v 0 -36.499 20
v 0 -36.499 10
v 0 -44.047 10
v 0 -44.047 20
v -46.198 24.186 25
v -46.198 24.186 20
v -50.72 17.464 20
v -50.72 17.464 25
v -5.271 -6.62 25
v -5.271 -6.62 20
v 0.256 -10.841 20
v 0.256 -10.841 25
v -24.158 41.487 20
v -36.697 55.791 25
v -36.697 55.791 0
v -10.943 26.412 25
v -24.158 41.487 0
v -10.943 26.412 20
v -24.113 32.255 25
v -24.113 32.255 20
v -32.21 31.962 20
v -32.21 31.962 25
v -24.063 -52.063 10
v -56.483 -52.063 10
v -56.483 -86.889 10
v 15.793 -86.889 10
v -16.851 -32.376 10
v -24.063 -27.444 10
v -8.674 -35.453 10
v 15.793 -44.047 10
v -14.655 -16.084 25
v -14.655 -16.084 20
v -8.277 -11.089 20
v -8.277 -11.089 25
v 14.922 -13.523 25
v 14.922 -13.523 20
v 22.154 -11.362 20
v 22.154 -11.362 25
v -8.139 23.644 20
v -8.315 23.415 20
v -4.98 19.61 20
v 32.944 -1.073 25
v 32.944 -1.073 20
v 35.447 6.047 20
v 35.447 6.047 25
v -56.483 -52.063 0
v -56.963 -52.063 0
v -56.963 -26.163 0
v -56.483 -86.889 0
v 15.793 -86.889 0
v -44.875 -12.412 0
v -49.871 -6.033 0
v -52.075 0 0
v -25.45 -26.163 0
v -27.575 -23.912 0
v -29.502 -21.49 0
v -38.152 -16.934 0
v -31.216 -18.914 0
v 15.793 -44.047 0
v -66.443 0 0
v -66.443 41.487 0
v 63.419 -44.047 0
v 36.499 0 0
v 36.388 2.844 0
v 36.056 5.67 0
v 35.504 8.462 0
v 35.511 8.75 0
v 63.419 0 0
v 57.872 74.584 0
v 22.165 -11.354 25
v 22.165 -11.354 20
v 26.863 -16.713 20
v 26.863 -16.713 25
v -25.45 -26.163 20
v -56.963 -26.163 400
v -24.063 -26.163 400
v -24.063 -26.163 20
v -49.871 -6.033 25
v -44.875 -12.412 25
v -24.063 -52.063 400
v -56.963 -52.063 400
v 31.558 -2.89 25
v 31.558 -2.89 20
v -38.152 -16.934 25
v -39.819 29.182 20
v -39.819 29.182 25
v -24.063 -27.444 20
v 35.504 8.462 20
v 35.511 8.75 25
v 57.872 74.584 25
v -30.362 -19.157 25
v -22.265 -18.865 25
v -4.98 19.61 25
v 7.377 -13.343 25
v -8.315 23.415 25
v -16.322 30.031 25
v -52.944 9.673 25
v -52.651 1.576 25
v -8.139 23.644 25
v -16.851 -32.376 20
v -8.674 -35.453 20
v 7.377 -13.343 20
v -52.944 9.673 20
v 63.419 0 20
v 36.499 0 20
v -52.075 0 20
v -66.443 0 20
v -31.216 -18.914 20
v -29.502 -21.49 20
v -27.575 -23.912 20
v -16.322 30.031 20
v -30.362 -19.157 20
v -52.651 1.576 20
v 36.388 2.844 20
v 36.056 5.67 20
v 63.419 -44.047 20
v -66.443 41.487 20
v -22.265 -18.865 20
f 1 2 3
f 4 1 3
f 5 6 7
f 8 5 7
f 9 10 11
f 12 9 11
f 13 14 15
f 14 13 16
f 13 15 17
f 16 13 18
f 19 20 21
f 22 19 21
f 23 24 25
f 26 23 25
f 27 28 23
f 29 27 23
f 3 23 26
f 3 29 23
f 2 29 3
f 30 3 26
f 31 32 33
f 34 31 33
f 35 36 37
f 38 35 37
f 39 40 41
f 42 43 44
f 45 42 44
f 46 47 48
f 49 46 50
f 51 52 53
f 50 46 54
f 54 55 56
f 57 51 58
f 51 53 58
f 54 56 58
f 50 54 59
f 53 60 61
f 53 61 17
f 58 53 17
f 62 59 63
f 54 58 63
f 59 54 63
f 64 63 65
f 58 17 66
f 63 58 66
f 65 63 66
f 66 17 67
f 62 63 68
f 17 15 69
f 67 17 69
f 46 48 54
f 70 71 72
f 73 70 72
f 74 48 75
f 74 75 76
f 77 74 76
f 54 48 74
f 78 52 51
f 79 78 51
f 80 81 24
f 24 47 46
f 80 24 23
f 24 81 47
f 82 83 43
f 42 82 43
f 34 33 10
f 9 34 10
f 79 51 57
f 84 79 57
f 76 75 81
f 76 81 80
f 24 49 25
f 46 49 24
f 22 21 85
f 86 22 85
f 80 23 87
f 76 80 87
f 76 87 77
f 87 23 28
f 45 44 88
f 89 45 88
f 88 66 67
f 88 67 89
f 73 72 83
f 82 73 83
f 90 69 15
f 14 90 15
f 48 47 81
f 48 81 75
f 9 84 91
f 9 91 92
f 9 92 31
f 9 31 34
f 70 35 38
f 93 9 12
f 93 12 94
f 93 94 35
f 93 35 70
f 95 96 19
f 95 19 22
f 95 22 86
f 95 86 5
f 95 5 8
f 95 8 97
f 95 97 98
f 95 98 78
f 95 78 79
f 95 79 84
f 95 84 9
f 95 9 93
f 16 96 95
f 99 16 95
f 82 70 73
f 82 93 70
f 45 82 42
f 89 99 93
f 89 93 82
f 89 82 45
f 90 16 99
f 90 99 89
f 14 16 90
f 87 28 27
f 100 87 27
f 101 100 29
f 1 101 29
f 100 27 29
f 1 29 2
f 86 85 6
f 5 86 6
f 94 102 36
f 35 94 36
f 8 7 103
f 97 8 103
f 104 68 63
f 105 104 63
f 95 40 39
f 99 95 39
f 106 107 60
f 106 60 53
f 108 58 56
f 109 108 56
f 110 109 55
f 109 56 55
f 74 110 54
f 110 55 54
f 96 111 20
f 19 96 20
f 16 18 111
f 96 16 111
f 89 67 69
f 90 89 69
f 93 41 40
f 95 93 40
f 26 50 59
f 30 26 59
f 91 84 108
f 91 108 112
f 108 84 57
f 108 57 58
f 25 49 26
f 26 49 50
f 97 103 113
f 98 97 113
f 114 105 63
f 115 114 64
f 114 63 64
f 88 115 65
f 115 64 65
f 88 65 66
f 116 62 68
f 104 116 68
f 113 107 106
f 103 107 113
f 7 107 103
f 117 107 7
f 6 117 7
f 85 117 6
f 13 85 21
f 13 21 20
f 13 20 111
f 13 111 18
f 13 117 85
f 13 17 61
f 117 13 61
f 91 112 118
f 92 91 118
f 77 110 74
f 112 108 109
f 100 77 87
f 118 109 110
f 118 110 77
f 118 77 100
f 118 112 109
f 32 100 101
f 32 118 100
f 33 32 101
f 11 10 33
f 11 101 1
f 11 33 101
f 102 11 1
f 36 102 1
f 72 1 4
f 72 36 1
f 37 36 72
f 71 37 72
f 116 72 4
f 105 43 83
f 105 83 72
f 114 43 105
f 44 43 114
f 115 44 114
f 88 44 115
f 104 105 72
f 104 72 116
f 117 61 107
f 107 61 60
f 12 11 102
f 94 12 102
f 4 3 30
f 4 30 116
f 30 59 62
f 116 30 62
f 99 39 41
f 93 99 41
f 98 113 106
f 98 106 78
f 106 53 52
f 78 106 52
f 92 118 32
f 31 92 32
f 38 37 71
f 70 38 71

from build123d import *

# Parameters (mm, degrees)
F1_DEPTH = 20
F3_DEPTH = 25
F4_W     = 32.8999999911
F4_H     = 25.900002569
F5_DEPTH = 400
F6_W     = 72.2760502249
F6_H     = 60.5556070805
F7_DEPTH = 10


with BuildPart() as f1:
    # F0 (on Top) → F1 (new body)
    with BuildSketch(Plane.XY):
        with BuildLine():
            Line((0, -36.4989928704), (0, 0))
            Line((0, 0), (-36.4989928704, 0))
            ThreePointArc((-36.4989928704, 0), (-25.8086853652, -25.8086853652), (0, -36.4989928704))
        make_face()
        with BuildLine():
            Line((-36.4989928704, 0), (0, 0))
            Line((0, 0), (0, 36.4989928704))
            ThreePointArc((0, 36.4989928704), (-25.8086853652, 25.8086853652), (-36.4989928704, 0))
        make_face()
        with BuildLine():
            Line((0, 36.4989928704), (0, 0))
            Line((0, 0), (36.4989928704, 0))
            ThreePointArc((36.4989928704, 0), (25.8086853652, 25.8086853652), (0, 36.4989928704))
        make_face()
        with BuildLine():
            Line((36.4989928704, 0), (0, 0))
            Line((0, 0), (0, -36.4989928704))
            ThreePointArc((0, -36.4989928704), (25.8086853652, -25.8086853652), (36.4989928704, 0))
        make_face()
        with BuildLine():
            Line((-66.4428547025, 0), (-36.4989928704, 0))
            ThreePointArc((-36.4989928704, 0), (-25.8086853652, 25.8086853652), (0, 36.4989928704))
            Line((0, 36.4989928704), (0, 41.486993432))
            Line((0, 41.486993432), (-66.4428547025, 41.486993432))
            Line((-66.4428547025, 41.486993432), (-66.4428547025, 0))
        make_face()
        with BuildLine():
            Line((63.4185671806, 0), (36.4989928704, 0))
            ThreePointArc((36.4989928704, 0), (25.8086853652, -25.8086853652), (0, -36.4989928704))
            Line((0, -36.4989928704), (0, -44.0467298031))
            Line((0, -44.0467298031), (63.4185671806, -44.0467298031))
            Line((63.4185671806, -44.0467298031), (63.4185671806, 0))
        make_face()
    extrude(amount=F1_DEPTH)

    # F2 (on Top) → F3 (join)
    with BuildSketch(Plane.XY):
        Polygon((57.8724933064, 74.5838845975), (-36.6974943524, 55.7911281579), (-10.9426933471, 26.4123254008), (-9.5999531063, 25.5090280786), (-8.1394452782, 23.6443783888), (-4.9307275448, 27.8466683828), (1.2793188629, 32.1364451441), (8.5110378867, 34.2972554104), (16.0565384823, 34.1175840178), (23.1772144787, 31.615018454), (29.1760444968, 27.0345272727), (33.465821258, 20.824480865), (35.6266315244, 13.5927618412), (35.511328062, 8.7504642912), align=None)
        Polygon((-9.5999531063, 25.5090280786), (-10.9426933471, 26.4123254008), (-8.3148280565, 23.414688726), (-8.1394452782, 23.6443783888), align=None)
        Polygon((-8.3148280565, 23.414688726), (-10.9426933471, 26.4123254008), (-16.3222458945, 30.0312944786), (-24.1129834259, 32.2549226939), (-32.2095540295, 31.962248502), (-39.8194089626, 29.181920892), (-46.1976426034, 24.186097702), (-50.7199090034, 17.4638049138), (-52.9435372187, 9.6730673824), (-52.6508630268, 1.5764967788), (-49.8705354168, -6.0333581543), (-44.8747122268, -12.4115917951), (-38.1524194386, -16.933858195), (-30.3616819072, -19.1574864104), (-22.2651113036, -18.8648122185), (-14.6552563705, -16.0844846085), (-8.2770227297, -11.0886614185), (-5.2710709409, -6.6203514508), (-5.7428686549, -6.2601036588), (-10.0326454161, -0.0500572511), (-12.1934556825, 7.1816617728), (-12.0137842899, 14.7271623684), (-9.5112187261, 21.8478383648), align=None)
        Polygon((35.4469601318, 6.0472612456), (35.511328062, 8.7504642912), (31.5576392107, -2.889575799), (32.944394568, -1.0734147508), align=None)
        Polygon((31.5576392107, -2.889575799), (35.511328062, 8.7504642912), (35.6266315244, 13.5927618412), (33.465821258, 20.824480865), (29.1760444968, 27.0345272727), (23.1772144787, 31.615018454), (16.0565384823, 34.1175840178), (8.5110378867, 34.2972554104), (1.2793188629, 32.1364451441), (-4.9307275448, 27.8466683828), (-8.1394452782, 23.6443783888), (-4.9795485535, 19.6100963847), (22.1651728078, -11.3542047802), (28.3639033867, -7.0722447689), align=None)
        Polygon((-4.9795485535, 19.6100963847), (-8.3148280565, 23.414688726), (-9.5112187261, 21.8478383648), (-12.0137842899, 14.7271623684), (-12.1934556825, 7.1816617728), (-10.0326454161, -0.0500572511), (-5.7428686549, -6.2601036588), (-5.2710709409, -6.6203514508), (-3.7547563298, -4.3663686303), (-1.5311281144, 3.4243689011), (-1.8238023063, 11.5209395047), (-4.6041299163, 19.1307944379), align=None)
        Polygon((26.8625039607, -16.7125053704), (31.5576392107, -2.889575799), (28.3639033867, -7.0722447689), (22.1651728078, -11.3542047802), align=None)
        Polygon((22.1651728078, -11.3542047802), (-4.9795485535, 19.6100963847), (-4.6041299163, 19.1307944379), (-1.8238023063, 11.5209395047), (-1.5311281144, 3.4243689011), (-3.7547563298, -4.3663686303), (-5.2710709409, -6.6203514508), (0.2559613631, -10.84059484), (7.3766373596, -13.3431604039), (14.9221379551, -13.5228317965), (22.153856979, -11.3620215301), align=None)
    extrude(amount=F3_DEPTH)

    # F4 (on Top) → F5 (join)
    with BuildSketch(Plane.XY):
        with Locations((-40.5125012621, -39.112502709)):
            Rectangle(F4_W, F4_H)
    extrude(amount=F5_DEPTH)

    # F6 (on Top) → F7 (join)
    with BuildSketch(Plane.XY):
        with Locations((-20.344610326, -56.6111132503)):
            Rectangle(F6_W, F6_H)
    extrude(amount=F7_DEPTH)


solid = f1.part
